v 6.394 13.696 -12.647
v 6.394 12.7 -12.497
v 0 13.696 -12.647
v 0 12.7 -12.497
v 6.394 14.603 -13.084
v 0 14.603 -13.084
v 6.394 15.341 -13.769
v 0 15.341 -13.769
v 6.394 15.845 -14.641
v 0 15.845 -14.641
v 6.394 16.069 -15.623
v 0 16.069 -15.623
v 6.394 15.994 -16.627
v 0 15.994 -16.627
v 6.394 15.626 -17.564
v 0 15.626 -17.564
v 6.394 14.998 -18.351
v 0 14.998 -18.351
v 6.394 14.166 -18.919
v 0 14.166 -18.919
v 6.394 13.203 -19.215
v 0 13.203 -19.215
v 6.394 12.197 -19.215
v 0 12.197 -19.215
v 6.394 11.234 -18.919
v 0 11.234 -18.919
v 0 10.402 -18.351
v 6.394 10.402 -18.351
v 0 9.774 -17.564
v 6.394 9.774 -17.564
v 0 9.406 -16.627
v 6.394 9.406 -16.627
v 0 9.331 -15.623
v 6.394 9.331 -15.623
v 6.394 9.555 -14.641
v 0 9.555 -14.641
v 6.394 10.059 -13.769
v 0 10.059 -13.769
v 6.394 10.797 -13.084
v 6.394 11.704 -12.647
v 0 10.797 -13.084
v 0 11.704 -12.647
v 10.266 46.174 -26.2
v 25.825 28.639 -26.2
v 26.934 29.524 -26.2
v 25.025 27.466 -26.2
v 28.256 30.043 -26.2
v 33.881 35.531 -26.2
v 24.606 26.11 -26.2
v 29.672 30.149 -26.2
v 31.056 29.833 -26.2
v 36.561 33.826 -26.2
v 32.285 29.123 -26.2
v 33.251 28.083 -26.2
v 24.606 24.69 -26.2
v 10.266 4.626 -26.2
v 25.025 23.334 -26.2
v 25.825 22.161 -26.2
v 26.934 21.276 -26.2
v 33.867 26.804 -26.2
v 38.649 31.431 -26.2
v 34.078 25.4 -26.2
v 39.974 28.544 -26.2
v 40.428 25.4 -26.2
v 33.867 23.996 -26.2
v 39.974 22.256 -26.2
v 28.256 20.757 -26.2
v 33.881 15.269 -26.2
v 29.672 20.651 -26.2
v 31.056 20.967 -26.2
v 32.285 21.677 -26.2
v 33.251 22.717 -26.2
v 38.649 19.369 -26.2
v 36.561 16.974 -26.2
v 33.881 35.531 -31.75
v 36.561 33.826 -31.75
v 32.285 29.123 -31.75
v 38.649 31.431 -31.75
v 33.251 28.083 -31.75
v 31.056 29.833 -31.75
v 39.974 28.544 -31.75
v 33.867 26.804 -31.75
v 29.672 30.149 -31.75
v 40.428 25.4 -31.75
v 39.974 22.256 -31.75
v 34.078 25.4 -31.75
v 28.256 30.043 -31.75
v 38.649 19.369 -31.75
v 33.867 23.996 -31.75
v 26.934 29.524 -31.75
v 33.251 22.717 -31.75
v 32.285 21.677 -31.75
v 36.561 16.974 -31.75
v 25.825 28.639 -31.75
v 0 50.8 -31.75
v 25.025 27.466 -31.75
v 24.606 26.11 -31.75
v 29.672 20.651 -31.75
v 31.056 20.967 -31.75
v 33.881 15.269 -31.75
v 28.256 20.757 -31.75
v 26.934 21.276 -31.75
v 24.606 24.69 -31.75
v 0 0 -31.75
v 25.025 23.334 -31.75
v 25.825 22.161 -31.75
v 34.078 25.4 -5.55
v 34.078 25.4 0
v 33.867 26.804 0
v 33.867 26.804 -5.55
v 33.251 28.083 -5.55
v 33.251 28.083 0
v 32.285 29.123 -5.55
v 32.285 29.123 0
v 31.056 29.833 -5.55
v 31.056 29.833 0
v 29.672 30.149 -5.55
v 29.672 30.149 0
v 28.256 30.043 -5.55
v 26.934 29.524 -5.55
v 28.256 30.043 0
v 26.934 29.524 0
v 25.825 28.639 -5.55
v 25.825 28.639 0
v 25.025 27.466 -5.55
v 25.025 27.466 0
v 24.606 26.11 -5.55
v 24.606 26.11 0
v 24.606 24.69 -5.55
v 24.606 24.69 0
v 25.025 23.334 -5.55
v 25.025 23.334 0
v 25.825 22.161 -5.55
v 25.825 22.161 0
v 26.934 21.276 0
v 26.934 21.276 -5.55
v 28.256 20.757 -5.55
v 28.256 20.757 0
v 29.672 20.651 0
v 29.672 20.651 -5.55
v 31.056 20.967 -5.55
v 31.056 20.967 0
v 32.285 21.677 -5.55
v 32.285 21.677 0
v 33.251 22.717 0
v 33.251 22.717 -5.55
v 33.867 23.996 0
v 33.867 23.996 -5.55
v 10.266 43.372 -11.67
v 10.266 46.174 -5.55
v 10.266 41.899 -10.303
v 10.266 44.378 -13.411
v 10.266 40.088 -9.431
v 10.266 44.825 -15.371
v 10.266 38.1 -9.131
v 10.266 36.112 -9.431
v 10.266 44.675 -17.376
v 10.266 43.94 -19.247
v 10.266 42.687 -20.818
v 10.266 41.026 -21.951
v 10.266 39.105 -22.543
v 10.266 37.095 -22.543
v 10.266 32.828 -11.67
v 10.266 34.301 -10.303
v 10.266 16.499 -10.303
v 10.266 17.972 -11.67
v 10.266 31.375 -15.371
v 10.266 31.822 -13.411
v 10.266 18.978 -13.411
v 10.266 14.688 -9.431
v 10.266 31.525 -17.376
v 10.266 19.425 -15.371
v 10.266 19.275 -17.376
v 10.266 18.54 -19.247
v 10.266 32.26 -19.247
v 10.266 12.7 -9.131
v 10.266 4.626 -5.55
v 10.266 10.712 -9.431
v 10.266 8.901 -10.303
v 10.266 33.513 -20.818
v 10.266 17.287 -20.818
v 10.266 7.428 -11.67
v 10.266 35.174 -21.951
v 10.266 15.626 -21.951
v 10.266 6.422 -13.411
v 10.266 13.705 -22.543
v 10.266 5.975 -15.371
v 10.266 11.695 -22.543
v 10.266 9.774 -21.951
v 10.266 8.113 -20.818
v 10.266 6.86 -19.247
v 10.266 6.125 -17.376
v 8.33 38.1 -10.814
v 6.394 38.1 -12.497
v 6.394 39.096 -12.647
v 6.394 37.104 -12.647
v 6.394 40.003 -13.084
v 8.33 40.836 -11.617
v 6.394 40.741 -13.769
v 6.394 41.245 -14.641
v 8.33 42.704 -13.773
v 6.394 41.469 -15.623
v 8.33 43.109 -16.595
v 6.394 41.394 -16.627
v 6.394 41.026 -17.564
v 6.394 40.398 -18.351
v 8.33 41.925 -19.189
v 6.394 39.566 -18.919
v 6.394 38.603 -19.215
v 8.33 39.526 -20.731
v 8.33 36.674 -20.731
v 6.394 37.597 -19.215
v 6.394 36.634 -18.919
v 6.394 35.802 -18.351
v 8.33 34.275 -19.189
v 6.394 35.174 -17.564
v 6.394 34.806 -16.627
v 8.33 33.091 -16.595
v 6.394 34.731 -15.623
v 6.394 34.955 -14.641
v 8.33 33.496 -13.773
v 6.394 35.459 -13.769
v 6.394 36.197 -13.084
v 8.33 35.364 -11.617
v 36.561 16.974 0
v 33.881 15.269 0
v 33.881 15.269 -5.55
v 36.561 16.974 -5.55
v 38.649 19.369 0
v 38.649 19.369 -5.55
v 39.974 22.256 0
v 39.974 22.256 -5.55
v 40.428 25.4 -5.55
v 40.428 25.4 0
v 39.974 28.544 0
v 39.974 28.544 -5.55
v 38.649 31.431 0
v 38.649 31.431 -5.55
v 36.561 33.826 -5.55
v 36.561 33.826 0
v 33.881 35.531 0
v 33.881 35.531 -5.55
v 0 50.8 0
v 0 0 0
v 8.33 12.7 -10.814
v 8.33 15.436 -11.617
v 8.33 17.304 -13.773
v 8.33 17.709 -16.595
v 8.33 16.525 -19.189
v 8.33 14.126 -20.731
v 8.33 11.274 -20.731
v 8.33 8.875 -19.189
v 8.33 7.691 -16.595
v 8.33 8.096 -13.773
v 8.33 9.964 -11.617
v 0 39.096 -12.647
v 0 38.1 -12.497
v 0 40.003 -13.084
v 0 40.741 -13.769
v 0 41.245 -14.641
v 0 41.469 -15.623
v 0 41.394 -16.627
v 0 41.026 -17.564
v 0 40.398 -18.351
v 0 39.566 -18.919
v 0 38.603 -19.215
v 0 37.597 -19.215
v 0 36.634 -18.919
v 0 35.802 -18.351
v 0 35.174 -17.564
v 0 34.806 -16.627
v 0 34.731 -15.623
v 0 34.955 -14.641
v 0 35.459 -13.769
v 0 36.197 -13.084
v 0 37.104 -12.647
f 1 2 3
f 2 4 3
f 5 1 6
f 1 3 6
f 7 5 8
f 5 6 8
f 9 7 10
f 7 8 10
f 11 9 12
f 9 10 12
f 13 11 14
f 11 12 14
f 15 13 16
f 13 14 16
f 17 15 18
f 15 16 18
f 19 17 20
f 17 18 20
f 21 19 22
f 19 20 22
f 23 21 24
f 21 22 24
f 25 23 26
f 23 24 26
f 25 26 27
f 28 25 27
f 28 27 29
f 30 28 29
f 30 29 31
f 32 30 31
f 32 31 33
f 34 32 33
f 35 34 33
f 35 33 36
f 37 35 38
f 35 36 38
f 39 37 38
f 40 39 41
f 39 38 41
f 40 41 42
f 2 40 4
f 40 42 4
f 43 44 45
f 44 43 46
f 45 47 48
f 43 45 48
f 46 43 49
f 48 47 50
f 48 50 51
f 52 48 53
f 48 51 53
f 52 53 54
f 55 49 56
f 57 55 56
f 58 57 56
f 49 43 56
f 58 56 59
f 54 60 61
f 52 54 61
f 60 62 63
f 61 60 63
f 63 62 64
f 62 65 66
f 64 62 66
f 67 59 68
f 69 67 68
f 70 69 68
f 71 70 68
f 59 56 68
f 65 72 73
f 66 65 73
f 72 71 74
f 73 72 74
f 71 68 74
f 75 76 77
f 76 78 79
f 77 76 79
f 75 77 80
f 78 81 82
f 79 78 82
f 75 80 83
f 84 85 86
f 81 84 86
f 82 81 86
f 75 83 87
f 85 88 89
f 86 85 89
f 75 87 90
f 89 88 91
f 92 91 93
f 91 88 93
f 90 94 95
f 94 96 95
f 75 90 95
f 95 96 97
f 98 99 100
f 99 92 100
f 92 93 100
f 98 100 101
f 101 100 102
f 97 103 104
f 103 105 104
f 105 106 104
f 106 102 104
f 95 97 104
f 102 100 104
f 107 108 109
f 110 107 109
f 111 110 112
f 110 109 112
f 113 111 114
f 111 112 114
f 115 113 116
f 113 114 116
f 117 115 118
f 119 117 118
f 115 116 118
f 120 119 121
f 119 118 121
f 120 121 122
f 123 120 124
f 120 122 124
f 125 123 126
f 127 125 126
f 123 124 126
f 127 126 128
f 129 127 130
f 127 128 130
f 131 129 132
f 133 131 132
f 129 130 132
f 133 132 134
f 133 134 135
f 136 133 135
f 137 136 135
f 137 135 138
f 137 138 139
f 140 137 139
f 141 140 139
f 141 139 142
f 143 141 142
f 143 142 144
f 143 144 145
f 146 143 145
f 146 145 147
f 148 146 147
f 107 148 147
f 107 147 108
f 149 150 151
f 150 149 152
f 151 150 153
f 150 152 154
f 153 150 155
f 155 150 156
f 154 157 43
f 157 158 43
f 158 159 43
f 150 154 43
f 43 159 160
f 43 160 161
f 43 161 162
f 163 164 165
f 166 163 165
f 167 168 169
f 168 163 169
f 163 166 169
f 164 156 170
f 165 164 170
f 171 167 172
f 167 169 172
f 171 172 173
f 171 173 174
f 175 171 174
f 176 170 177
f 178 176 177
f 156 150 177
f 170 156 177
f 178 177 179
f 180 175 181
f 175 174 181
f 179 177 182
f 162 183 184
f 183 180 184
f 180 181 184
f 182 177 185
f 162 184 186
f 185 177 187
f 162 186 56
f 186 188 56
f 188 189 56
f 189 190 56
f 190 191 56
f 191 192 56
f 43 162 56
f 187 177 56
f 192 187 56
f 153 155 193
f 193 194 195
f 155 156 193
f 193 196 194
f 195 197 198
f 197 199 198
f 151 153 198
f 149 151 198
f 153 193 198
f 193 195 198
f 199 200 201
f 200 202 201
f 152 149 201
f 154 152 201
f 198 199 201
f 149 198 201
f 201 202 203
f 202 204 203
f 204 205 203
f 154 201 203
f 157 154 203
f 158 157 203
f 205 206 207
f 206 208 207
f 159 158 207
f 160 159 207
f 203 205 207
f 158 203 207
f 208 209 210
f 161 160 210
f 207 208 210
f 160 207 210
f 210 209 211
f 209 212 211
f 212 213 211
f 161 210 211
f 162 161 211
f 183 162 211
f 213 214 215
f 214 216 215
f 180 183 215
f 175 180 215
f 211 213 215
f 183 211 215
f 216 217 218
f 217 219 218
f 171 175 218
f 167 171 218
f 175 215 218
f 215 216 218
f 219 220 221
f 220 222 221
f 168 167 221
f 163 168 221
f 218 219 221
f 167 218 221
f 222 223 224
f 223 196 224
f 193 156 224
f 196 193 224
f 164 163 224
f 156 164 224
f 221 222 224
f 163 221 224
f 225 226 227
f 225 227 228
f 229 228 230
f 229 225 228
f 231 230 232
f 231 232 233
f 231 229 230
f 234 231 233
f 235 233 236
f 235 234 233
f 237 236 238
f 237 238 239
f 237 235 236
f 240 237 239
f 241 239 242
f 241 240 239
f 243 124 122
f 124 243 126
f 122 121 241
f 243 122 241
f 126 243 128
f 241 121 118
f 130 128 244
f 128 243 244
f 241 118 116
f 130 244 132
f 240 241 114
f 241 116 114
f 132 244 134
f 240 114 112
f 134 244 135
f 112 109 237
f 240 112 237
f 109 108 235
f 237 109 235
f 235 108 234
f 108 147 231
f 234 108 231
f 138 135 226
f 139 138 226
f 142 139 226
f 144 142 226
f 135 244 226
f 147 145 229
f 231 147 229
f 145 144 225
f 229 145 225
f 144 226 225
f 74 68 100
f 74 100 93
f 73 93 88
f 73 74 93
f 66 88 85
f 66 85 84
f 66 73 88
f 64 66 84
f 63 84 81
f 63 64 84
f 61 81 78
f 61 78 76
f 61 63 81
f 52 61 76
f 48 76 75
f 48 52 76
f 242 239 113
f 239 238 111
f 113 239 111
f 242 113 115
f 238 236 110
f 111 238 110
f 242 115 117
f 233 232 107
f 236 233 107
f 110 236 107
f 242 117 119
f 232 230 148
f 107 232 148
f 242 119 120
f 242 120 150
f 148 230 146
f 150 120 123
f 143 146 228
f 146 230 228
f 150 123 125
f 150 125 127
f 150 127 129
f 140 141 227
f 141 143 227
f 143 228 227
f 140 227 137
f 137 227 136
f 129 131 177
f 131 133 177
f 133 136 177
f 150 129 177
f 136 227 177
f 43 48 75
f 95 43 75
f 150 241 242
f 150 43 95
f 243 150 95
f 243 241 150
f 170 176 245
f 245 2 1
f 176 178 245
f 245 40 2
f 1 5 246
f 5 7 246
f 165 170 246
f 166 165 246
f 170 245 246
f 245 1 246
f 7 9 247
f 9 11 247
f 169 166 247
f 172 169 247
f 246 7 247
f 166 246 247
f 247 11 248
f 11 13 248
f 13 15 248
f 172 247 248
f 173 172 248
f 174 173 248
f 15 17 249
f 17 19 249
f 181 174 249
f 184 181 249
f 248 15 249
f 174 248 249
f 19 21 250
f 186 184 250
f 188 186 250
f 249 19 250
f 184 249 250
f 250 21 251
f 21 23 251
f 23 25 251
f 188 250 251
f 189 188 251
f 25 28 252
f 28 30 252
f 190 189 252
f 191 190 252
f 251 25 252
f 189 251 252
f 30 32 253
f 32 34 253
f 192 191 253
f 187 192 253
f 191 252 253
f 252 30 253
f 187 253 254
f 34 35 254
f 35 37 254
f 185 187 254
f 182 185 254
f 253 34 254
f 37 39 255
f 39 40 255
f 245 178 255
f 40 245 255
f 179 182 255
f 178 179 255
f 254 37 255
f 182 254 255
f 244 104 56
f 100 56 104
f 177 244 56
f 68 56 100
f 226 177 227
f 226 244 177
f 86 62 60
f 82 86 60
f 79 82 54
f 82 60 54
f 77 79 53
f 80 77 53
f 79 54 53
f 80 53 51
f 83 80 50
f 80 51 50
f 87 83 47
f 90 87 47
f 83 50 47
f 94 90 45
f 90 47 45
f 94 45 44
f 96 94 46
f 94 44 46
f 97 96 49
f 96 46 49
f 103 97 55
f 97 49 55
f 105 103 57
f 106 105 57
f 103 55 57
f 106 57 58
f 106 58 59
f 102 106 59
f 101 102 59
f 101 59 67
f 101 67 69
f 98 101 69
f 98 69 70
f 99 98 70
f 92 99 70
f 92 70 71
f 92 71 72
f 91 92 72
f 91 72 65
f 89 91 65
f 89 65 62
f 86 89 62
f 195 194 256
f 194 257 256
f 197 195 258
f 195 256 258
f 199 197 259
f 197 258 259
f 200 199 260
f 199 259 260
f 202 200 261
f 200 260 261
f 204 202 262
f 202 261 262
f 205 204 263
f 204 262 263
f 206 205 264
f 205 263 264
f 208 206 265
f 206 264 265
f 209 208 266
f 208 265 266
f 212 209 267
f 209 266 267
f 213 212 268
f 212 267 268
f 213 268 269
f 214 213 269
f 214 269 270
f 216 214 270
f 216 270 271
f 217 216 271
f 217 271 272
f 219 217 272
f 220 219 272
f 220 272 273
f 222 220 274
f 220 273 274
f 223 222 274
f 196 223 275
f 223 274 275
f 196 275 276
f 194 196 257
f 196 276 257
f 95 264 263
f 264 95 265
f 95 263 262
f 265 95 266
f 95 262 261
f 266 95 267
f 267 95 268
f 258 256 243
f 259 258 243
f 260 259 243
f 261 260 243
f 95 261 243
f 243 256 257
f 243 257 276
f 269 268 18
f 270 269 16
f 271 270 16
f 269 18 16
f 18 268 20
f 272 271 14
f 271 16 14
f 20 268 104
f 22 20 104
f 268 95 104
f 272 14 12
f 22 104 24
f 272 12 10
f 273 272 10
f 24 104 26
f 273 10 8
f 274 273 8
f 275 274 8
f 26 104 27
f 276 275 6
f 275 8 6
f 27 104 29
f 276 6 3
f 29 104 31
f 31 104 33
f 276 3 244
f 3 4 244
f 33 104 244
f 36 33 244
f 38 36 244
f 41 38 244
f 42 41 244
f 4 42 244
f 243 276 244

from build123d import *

# Parameters (mm, degrees)
CAMBER_BLOCK_EXTRUDE_DEPTH                          = 50.8
CSK_FOR_1_4_FLAT_HEAD_MACHINE_SCREW_100_D           = 6.7564
CSK_FOR_1_4_FLAT_HEAD_MACHINE_SCREW_100_CSINK_D     = 13.4874
CSK_FOR_1_4_FLAT_HEAD_MACHINE_SCREW_100_CSINK_ANGLE = 82
CUT_EXTRUDE1_REACH                                  = 75.171
SKETCH5_R                                           = 4.7625


with BuildPart() as part:
    # Sketch1 → Camber Block Extrude (new body)
    with BuildSketch(Plane(origin=(0, 0, 0), x_dir=(1, 0, 0), z_dir=(0, 1, 0))):
        Polygon((0, 0), (42.015665571, 0), (42.015665571, 5.5499), (10.265665571, 5.5499), (10.265665571, 26.2001), (42.015665571, 26.2001), (42.015665571, 31.75), (0, 31.75), align=None)
    extrude(amount=CAMBER_BLOCK_EXTRUDE_DEPTH)

    # CSK for 1/4 Flat Head Machine Screw (100)1 (through all)
    with Locations(Plane(origin=(10.265665571, 0, 0), x_dir=(0, 0, -1), z_dir=(1, 0, 0))):
        with Locations((15.875, 12.7), (15.875, 38.1)):
            CounterSinkHole(CSK_FOR_1_4_FLAT_HEAD_MACHINE_SCREW_100_D / 2, CSK_FOR_1_4_FLAT_HEAD_MACHINE_SCREW_100_CSINK_D / 2, counter_sink_angle=CSK_FOR_1_4_FLAT_HEAD_MACHINE_SCREW_100_CSINK_ANGLE)

    # Cut-Extrude1: up to this face of the body (flat: up to its plane)
    cut_extrude1_end = Plane(part.part.faces().sort_by_distance((21.007832786, 25.4, -31.75))[0])
    # Sketch5 → Cut-Extrude1 (cut, up to the picked face)
    with BuildSketch(Plane.XY, mode=Mode.PRIVATE) as cut_extrude1_sk1:
        with Locations((29.315665571, 25.4)):
            Circle(SKETCH5_R)
    cut_extrude1_tool1 = split(extrude(cut_extrude1_sk1.sketch, amount=-CUT_EXTRUDE1_REACH, mode=Mode.PRIVATE), bisect_by=cut_extrude1_end, keep=Keep.BOTH, mode=Mode.PRIVATE)
    # Sketch5 → Cut-Extrude1 (cut, up to the picked face)
    with BuildSketch(Plane.XY, mode=Mode.PRIVATE) as cut_extrude1_sk2:
        with BuildLine():
            Line((0, 0), (33.881349019, 15.26875176))
            ThreePointArc((33.881349019, 15.26875176), (40.428165571, 25.4), (33.881349019, 35.53124824))
            Line((33.881349019, 35.53124824), (0, 50.8))
            Line((0, 50.8), (42.015665571, 50.8))
            Line((42.015665571, 50.8), (42.015665571, 0))
            Line((42.015665571, 0), (0, 0))
        make_face()
    cut_extrude1_tool2 = split(extrude(cut_extrude1_sk2.sketch, amount=-CUT_EXTRUDE1_REACH, mode=Mode.PRIVATE), bisect_by=cut_extrude1_end, keep=Keep.BOTH, mode=Mode.PRIVATE)
    add(cut_extrude1_tool1.solids().sort_by(Axis((29.315666, 25.4, 0), (0, 0, -1)))[0], mode=Mode.SUBTRACT)
    add(cut_extrude1_tool2.solids().sort_by(Axis((17.211529, 7.033349, 0), (0, 0, -1)))[0], mode=Mode.SUBTRACT)


solid = part.part
